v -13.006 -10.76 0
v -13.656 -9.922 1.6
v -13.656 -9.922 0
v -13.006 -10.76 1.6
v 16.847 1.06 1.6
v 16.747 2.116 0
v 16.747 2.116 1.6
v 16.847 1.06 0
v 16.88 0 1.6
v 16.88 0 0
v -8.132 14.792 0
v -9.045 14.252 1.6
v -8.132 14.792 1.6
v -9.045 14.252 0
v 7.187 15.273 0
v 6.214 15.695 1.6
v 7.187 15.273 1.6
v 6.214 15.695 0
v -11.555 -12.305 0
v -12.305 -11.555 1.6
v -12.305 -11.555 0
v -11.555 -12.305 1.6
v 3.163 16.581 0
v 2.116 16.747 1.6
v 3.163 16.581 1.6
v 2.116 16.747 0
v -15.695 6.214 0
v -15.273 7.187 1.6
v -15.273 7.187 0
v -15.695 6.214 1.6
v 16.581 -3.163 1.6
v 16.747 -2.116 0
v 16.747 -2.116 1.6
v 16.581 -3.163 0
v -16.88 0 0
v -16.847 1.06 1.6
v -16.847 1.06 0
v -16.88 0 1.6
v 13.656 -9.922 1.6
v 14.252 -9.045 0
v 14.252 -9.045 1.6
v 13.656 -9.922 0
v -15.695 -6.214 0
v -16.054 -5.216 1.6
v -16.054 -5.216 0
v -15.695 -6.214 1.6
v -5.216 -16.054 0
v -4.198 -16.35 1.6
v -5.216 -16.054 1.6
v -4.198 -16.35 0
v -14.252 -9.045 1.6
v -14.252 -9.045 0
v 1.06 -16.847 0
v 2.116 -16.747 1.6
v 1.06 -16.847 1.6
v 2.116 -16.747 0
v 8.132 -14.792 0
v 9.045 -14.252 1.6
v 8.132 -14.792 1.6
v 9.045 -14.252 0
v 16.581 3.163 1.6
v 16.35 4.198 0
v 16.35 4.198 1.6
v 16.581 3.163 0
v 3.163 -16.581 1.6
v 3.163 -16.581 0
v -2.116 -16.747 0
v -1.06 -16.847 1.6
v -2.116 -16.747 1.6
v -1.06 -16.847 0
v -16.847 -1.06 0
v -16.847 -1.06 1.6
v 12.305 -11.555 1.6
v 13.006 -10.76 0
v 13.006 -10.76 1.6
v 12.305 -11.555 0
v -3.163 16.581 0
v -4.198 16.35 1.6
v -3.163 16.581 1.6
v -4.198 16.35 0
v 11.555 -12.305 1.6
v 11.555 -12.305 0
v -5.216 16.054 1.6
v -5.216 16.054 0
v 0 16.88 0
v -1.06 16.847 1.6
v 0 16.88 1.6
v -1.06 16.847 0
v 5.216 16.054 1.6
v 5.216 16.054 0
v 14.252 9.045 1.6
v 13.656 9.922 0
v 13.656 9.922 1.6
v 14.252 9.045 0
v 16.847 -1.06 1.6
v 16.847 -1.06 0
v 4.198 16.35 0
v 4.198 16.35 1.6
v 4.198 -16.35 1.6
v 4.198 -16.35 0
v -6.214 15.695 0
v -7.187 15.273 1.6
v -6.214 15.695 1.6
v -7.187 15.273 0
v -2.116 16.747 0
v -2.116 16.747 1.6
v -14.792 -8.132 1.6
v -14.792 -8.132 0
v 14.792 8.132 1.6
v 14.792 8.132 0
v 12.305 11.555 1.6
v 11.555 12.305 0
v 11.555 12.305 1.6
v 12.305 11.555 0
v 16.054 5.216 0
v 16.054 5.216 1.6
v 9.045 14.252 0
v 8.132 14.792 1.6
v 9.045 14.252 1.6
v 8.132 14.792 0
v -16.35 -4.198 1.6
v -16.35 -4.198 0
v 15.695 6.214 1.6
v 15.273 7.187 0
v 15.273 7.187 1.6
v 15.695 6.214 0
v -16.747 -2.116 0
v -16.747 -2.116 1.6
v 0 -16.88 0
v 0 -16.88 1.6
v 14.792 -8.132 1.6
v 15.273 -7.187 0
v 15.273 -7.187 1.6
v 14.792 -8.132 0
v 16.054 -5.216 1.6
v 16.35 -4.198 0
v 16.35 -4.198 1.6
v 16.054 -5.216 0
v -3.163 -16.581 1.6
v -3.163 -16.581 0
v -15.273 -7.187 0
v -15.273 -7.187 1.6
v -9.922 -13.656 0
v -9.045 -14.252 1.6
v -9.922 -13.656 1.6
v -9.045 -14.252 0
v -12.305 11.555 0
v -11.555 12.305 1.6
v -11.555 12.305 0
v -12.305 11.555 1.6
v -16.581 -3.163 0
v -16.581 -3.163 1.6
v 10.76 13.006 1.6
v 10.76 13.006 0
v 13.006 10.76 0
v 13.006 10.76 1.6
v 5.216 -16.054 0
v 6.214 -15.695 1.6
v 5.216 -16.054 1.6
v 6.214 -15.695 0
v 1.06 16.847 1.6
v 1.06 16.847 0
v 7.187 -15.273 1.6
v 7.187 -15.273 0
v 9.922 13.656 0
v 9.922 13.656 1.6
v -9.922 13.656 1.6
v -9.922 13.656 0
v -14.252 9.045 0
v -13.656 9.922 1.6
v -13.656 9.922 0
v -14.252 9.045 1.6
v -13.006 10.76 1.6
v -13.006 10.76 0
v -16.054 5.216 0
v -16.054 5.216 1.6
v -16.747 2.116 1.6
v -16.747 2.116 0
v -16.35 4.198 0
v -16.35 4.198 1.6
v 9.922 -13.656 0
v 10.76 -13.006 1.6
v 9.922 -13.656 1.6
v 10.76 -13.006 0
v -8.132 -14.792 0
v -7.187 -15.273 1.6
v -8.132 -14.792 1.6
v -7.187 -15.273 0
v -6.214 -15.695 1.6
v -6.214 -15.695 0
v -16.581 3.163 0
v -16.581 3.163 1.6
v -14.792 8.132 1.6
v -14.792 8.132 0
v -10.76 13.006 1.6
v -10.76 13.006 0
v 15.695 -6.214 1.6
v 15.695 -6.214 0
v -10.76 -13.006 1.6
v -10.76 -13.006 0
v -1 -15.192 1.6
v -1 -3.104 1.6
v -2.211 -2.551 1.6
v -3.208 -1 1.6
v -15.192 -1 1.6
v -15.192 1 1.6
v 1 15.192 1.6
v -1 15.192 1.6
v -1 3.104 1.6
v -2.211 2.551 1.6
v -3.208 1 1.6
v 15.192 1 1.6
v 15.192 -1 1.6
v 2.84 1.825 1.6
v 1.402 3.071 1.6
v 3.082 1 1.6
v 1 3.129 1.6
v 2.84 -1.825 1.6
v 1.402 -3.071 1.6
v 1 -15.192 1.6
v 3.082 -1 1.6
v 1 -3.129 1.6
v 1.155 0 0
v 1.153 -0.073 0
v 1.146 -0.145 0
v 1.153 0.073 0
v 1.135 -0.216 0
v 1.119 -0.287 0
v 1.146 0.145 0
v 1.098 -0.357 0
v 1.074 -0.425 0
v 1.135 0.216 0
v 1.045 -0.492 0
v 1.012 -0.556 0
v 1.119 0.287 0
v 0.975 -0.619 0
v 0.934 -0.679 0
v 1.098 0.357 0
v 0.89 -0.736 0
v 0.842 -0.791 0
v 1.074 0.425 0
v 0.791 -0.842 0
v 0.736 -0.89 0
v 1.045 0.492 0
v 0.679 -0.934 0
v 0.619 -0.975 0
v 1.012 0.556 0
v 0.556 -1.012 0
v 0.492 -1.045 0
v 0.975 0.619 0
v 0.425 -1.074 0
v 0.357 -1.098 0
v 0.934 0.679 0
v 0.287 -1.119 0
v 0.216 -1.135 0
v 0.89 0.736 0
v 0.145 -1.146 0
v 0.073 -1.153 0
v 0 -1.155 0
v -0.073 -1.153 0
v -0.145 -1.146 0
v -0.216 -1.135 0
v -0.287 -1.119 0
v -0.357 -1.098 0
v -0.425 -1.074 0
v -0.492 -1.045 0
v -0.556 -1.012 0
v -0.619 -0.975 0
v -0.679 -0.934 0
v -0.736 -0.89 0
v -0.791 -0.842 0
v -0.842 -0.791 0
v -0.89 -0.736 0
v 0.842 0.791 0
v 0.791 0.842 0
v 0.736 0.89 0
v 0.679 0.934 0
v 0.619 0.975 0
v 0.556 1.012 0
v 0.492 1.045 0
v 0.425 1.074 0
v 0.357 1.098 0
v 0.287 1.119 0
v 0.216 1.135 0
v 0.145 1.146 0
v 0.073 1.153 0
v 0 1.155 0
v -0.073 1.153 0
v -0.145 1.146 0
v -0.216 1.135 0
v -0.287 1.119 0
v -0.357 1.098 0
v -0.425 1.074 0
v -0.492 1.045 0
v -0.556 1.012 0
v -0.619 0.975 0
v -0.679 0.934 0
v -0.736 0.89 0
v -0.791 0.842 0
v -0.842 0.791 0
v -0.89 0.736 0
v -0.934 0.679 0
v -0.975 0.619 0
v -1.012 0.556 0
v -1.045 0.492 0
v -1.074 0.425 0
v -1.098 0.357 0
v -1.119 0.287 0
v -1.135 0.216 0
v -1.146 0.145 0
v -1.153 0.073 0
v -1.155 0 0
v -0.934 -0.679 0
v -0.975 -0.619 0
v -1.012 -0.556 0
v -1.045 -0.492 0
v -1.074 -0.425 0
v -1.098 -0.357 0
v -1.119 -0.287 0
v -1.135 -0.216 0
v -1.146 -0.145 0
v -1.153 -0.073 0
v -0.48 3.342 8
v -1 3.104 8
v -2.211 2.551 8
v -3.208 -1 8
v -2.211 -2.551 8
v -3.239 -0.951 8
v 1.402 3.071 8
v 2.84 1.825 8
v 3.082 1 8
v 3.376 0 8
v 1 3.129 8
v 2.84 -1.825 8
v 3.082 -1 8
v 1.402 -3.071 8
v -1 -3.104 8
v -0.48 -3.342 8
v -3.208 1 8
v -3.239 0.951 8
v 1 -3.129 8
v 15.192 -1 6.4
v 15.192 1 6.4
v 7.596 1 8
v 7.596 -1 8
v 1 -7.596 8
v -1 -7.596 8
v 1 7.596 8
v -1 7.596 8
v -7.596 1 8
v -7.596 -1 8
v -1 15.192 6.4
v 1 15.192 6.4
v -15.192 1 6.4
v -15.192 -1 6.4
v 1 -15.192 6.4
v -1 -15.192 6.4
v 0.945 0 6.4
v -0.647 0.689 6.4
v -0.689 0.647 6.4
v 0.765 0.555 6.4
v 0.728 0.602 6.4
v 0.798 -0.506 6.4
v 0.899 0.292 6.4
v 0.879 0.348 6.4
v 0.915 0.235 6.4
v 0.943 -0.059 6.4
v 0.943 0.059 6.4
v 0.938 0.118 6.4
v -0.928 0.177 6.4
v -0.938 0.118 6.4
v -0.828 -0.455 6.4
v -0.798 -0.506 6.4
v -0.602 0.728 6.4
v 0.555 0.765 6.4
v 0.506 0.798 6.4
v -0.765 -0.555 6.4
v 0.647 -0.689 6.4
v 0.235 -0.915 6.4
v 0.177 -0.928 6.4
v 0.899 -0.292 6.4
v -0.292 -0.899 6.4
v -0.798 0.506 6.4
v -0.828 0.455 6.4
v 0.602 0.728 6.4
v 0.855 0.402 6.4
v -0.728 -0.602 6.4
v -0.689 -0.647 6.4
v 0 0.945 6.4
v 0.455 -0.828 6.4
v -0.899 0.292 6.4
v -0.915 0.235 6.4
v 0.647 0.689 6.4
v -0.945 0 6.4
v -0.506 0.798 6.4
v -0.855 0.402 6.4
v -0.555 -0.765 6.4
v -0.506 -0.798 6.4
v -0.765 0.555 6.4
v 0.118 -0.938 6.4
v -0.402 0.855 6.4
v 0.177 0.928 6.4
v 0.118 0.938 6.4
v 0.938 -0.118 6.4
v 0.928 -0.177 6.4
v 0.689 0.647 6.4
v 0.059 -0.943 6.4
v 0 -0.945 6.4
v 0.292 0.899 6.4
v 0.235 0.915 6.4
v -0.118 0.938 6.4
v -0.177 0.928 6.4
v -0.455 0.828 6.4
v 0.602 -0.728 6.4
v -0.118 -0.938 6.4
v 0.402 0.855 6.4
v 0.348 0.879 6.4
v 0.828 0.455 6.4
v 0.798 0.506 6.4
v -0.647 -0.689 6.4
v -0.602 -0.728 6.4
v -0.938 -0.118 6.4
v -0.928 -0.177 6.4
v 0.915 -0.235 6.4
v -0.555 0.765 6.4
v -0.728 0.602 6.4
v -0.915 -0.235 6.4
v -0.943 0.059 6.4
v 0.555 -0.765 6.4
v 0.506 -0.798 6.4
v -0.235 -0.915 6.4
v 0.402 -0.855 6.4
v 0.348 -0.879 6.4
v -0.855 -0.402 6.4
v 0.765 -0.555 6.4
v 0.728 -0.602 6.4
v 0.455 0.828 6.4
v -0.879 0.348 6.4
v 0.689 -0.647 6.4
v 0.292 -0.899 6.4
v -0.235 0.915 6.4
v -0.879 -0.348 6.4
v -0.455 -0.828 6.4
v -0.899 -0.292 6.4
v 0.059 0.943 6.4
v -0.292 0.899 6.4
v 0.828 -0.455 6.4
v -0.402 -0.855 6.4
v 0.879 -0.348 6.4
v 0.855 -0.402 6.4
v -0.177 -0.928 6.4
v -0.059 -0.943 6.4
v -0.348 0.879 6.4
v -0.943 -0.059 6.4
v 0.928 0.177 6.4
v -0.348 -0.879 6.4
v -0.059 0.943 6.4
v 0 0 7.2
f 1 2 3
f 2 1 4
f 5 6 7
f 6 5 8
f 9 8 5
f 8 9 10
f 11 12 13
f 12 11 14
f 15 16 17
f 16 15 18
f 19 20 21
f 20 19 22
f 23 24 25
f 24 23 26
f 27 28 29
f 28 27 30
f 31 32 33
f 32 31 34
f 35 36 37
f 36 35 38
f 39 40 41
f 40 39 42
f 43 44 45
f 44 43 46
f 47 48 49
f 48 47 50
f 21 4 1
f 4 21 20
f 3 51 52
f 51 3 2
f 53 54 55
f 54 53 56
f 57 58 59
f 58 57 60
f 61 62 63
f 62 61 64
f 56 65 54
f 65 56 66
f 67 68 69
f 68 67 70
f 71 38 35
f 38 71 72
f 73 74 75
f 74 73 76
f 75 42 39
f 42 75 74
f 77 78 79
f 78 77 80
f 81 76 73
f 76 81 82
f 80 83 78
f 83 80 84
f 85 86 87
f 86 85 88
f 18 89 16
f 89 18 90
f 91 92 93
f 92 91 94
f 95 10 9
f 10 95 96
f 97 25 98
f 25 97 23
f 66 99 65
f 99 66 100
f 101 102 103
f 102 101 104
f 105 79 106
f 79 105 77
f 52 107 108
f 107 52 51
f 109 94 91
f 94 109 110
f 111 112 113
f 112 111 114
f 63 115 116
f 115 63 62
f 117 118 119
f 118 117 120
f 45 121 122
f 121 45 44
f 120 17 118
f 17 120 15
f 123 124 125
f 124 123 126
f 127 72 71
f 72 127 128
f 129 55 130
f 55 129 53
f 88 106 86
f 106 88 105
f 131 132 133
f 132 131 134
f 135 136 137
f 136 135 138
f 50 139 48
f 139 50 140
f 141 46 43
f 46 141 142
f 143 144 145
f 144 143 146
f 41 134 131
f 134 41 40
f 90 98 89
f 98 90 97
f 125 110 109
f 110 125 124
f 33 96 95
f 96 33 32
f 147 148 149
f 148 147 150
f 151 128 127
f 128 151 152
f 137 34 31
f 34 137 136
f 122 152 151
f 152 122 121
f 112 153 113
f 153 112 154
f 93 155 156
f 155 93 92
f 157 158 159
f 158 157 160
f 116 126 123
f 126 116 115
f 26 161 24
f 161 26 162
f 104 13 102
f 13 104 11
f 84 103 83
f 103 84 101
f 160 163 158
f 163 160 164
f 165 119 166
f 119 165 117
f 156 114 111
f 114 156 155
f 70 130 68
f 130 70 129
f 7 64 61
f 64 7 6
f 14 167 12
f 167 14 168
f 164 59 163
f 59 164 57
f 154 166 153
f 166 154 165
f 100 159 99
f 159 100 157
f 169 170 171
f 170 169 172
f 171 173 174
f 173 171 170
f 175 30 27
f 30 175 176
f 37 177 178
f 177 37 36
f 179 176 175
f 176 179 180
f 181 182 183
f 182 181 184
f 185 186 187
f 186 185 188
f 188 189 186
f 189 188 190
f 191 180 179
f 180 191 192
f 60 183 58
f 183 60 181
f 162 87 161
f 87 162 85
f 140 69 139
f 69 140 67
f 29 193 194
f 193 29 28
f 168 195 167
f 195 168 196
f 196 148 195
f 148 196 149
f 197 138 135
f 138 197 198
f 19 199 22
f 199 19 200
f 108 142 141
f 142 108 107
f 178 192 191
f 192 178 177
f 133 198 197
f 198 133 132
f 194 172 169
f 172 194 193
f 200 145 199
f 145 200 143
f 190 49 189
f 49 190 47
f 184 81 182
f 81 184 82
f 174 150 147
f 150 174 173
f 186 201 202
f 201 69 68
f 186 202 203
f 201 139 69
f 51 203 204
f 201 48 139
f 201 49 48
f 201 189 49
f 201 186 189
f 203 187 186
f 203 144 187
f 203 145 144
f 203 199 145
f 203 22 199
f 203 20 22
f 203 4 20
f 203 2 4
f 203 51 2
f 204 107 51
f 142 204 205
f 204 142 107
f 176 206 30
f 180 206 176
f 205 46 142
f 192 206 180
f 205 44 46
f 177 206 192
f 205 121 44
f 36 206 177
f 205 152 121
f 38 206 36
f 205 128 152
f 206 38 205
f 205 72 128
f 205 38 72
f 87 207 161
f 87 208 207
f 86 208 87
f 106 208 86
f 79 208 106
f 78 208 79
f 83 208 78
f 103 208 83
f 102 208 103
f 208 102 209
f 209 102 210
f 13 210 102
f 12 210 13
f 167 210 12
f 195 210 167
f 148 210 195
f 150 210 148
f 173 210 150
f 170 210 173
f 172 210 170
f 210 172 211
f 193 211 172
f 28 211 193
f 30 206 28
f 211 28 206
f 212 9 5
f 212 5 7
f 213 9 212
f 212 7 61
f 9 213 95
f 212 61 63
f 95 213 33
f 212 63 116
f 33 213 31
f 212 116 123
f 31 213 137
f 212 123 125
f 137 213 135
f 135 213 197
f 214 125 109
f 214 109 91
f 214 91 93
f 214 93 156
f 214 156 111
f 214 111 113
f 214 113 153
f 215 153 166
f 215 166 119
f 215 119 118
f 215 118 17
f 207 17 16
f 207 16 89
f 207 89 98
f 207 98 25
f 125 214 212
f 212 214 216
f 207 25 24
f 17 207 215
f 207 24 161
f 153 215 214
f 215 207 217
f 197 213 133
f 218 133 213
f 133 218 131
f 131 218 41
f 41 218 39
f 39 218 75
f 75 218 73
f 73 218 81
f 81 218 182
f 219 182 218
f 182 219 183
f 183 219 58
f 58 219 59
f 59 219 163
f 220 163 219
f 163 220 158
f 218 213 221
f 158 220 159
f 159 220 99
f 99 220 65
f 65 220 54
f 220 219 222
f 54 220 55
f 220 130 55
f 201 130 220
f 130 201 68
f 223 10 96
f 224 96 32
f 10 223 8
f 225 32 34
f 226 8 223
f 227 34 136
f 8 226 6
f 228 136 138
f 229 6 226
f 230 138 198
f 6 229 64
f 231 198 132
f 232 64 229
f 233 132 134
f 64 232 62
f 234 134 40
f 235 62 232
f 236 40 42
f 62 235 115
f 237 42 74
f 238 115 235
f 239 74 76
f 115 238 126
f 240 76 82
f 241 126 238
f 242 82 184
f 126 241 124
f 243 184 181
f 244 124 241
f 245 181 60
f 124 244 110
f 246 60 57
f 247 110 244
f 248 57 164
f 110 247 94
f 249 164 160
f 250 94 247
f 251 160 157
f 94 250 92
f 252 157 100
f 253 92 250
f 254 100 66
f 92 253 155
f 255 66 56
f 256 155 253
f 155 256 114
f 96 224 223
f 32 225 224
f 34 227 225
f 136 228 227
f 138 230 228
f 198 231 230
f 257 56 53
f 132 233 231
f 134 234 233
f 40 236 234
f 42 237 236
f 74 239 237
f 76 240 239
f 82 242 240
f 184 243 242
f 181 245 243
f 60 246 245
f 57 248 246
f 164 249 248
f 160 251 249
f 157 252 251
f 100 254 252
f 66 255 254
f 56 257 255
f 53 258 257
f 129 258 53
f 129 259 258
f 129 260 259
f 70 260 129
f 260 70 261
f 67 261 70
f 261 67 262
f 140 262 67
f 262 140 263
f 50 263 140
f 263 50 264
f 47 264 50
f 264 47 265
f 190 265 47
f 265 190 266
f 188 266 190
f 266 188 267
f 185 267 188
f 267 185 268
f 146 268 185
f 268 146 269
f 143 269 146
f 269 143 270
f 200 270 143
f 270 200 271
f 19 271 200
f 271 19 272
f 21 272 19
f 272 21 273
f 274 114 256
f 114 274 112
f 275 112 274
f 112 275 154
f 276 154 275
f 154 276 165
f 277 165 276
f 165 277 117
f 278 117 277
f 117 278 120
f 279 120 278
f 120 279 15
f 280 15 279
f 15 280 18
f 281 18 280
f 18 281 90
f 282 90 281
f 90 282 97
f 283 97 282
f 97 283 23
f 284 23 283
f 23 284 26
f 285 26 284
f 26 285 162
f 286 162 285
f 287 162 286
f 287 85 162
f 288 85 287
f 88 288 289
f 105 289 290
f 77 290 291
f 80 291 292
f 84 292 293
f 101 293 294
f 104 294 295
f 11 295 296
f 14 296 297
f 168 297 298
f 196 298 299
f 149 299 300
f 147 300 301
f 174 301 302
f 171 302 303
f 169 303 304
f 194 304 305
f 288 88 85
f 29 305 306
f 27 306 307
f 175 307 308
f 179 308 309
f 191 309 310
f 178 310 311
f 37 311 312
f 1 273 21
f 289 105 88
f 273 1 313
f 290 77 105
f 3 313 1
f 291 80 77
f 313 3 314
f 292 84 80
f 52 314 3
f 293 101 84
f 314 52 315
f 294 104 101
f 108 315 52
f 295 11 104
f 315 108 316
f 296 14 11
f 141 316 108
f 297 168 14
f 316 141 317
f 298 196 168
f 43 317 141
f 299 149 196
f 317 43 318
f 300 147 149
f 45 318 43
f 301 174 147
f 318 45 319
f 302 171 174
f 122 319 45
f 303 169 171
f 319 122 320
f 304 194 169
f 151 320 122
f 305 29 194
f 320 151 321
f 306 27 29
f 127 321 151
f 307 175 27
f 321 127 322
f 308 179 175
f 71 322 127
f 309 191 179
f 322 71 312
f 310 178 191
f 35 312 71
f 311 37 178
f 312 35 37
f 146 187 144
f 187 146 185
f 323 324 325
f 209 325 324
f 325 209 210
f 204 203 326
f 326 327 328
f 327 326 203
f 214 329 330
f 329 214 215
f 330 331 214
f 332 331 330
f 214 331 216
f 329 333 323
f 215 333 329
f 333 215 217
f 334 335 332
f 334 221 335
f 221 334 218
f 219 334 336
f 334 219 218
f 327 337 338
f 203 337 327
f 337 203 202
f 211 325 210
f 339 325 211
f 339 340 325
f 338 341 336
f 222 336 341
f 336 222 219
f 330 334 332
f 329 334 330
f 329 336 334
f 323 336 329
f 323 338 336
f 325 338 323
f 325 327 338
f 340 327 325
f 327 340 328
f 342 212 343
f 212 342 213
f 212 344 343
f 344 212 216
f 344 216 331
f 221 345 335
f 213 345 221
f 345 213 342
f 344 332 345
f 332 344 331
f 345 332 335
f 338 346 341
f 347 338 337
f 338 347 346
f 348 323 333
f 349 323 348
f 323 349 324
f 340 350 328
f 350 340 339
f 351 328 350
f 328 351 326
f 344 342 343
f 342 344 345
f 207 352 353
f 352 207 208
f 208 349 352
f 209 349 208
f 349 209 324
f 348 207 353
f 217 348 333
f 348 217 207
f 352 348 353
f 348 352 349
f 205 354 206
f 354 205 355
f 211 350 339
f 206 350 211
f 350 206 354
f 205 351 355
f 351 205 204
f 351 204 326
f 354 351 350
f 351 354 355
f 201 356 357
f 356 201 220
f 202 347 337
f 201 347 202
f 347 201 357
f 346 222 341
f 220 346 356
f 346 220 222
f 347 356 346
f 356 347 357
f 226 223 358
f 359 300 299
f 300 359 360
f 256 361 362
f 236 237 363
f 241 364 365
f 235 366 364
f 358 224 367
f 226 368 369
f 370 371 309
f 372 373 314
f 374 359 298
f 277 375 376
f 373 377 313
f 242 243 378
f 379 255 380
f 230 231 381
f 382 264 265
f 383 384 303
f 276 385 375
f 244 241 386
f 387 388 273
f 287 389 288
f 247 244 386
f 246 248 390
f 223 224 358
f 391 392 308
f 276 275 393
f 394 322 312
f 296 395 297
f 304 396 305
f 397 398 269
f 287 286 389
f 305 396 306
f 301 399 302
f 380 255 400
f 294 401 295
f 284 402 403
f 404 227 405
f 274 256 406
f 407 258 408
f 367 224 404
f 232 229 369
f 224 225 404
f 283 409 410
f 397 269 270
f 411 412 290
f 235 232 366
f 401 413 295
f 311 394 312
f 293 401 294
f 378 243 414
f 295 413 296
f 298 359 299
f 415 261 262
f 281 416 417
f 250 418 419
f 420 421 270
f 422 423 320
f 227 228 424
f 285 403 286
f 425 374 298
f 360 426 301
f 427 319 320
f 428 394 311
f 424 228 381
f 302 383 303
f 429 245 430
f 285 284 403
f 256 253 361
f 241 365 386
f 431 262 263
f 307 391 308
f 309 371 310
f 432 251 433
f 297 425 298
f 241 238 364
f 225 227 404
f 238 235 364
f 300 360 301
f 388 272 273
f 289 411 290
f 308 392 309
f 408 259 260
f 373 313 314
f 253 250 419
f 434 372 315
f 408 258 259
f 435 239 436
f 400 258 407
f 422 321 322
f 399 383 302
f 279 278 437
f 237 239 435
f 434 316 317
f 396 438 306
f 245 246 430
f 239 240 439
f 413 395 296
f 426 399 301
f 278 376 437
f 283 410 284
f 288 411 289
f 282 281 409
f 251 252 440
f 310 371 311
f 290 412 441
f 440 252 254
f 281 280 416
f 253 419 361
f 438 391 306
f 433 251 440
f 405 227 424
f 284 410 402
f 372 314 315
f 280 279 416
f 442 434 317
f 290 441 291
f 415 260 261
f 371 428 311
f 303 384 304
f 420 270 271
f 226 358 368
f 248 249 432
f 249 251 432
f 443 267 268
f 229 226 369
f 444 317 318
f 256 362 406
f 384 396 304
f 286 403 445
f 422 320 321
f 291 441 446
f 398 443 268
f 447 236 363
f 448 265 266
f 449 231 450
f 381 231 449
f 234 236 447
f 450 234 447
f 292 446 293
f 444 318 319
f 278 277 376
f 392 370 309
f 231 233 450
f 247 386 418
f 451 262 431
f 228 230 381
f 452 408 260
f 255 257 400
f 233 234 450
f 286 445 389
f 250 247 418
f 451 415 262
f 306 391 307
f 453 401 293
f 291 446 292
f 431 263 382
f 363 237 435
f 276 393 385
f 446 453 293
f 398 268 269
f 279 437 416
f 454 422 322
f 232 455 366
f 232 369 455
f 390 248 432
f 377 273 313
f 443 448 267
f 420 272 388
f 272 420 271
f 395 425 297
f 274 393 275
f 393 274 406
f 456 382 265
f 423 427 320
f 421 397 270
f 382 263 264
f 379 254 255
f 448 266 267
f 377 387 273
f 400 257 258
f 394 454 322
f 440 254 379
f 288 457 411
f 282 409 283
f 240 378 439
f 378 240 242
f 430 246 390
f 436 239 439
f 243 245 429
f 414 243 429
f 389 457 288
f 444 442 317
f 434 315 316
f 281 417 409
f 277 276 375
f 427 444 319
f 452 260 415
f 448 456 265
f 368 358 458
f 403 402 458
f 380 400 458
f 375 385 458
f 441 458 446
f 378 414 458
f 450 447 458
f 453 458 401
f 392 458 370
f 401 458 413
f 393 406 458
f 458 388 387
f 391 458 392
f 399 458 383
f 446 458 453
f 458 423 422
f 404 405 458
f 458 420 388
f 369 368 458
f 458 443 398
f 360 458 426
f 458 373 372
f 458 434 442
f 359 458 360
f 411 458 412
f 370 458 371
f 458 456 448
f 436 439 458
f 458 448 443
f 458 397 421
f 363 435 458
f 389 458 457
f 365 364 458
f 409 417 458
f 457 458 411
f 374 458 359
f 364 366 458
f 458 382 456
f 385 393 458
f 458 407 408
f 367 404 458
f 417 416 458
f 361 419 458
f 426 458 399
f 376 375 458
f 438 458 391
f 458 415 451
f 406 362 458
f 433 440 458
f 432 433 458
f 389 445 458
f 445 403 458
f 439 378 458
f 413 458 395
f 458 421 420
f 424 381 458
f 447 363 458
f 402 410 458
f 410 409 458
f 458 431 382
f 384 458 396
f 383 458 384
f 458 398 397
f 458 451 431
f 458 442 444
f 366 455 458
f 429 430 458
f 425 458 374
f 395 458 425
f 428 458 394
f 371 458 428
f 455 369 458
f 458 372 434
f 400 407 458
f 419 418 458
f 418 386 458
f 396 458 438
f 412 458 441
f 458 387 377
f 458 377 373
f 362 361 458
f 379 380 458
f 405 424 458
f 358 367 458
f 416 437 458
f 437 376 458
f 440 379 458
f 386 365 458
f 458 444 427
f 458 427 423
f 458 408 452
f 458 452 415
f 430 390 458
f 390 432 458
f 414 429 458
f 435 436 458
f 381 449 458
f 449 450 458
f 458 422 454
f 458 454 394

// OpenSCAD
// file: dimensions.scad
module cut(color, offset) {
    difference() {
        children();
        color(color) translate([-200,-100,offset*2-100]) cube(200);    
    }
}

// To adjust for an imperfect world.
// Only Applied to internal threads.
// Intended to be added to the radius
thread_spacing = 0.5;
// hack since threads are defined by the outer diameter but i'm using them from an inner diameter perspective and i don't
// want to figure out how deep the threads are
// If i redesign this i'd use the threads libs more to create whole shapes that i cut from.
// Or figure out how to give it a flag to say "assume the diameter is the inner one"
thread_depth = 4.4; // I just adjusted this number until the threads were outside of the object but I saw no gap

// DC motor housing/chamber
height = 47;
innerRadius = 14.1;
wallThickness = 3;
dcMotorChamberOuterRadius = innerRadius+wallThickness;
echo("dcMotorChamberOuterRadius", dcMotorChamberOuterRadius);
wireHoleRadius = 2;
threadLength = 10;

// Chamber divider
// +0.5 are clearances
shaftHoleDiameter = 2.1 + 0.5; // shaft + clearance to not lockup shaft
dcMotorShaftHolderPotrutionHeight = 2.5; // Basically all dc motors have a small potrution around the shaft.
dcMotorShaftHolderPotrutionDiameter = 9.7 + 0.5;
dividerHeight = wallThickness+dcMotorShaftHolderPotrutionHeight + threadLength;
chamberDividerInnerRadius = dcMotorChamberOuterRadius + thread_spacing;
chamberDividerOuterRadius = chamberDividerInnerRadius + wallThickness;

// Impeller chamber
impellerHeight = 10;
impellerChamberInnerRadius = chamberDividerOuterRadius + thread_spacing;
echo("impellerChamberInnerRadius", impellerChamberInnerRadius);
impellerChamberInnerHeight = impellerHeight;
impellerChamberOuterRadius = impellerChamberInnerRadius + wallThickness;
impellerChamberOuterHeight = impellerChamberInnerHeight + wallThickness + threadLength;
inputHoseInnerDiameter = 8;


tubeConnectorWallThickness = 1; // you probaby don't need to change this
tubeConnectorHoleRadius = (inputHoseInnerDiameter - tubeConnectorWallThickness*2)/2;


rotate_extrude_angle=360;
// main file
include <dimensions.scad>



module impeller_fin(height=10, depth=20) {
    
    rotate([90]) linear_extrude(2) {
        polygon([
            [0,0],
            [depth, 0],
            [depth, height*0.75],
            [depth*0.5, height],
            [0, height],
        ]);
    }
}


/**
*   shaft_radius: for adjusting the size of the hole for the shaft.
*       The shaft hole will start scaled to 1.1 and end at 0.9 to pinch the shaft.
*/
module impeller(height=10, radius=20, shaft_diameter=2) {
    shaft_radius = shaft_diameter/2;
    basePlateHeight = height/5;
    finHeight = height*4/5;
    finDepth = radius*0.9;
    difference() {
        union() {
            
            cylinder(basePlateHeight, radius, radius, $fn=100);
            translate([0,0,basePlateHeight]) cylinder(finHeight, radius*0.2, radius*0.2);
            

            
            rotate([0,0,0])  translate([0, 1 ,basePlateHeight]) impeller_fin(finHeight, finDepth);
            rotate([0,0,90]) translate([0, 1 ,basePlateHeight]) impeller_fin(finHeight, finDepth);
            rotate([0,0,180]) translate([0, 1 ,basePlateHeight]) impeller_fin(finHeight, finDepth);
            rotate([0,0,270]) translate([0, 1 ,basePlateHeight]) impeller_fin(finHeight, finDepth);
        }
        
        
        cylinder(height*0.8, shaft_radius*1.1, shaft_radius*0.9, $fn=100);
        translate([0,0,height*0.8]) cylinder(height*0.1, shaft_radius*0.9, 0, $fn=100);
    }
    
}

impeller_height = impellerChamberInnerHeight*0.8;
impeller_radius = impellerChamberInnerRadius*0.8;

echo("impeller height", impeller_height )
impeller(impeller_height, impeller_radius, 2.1);
